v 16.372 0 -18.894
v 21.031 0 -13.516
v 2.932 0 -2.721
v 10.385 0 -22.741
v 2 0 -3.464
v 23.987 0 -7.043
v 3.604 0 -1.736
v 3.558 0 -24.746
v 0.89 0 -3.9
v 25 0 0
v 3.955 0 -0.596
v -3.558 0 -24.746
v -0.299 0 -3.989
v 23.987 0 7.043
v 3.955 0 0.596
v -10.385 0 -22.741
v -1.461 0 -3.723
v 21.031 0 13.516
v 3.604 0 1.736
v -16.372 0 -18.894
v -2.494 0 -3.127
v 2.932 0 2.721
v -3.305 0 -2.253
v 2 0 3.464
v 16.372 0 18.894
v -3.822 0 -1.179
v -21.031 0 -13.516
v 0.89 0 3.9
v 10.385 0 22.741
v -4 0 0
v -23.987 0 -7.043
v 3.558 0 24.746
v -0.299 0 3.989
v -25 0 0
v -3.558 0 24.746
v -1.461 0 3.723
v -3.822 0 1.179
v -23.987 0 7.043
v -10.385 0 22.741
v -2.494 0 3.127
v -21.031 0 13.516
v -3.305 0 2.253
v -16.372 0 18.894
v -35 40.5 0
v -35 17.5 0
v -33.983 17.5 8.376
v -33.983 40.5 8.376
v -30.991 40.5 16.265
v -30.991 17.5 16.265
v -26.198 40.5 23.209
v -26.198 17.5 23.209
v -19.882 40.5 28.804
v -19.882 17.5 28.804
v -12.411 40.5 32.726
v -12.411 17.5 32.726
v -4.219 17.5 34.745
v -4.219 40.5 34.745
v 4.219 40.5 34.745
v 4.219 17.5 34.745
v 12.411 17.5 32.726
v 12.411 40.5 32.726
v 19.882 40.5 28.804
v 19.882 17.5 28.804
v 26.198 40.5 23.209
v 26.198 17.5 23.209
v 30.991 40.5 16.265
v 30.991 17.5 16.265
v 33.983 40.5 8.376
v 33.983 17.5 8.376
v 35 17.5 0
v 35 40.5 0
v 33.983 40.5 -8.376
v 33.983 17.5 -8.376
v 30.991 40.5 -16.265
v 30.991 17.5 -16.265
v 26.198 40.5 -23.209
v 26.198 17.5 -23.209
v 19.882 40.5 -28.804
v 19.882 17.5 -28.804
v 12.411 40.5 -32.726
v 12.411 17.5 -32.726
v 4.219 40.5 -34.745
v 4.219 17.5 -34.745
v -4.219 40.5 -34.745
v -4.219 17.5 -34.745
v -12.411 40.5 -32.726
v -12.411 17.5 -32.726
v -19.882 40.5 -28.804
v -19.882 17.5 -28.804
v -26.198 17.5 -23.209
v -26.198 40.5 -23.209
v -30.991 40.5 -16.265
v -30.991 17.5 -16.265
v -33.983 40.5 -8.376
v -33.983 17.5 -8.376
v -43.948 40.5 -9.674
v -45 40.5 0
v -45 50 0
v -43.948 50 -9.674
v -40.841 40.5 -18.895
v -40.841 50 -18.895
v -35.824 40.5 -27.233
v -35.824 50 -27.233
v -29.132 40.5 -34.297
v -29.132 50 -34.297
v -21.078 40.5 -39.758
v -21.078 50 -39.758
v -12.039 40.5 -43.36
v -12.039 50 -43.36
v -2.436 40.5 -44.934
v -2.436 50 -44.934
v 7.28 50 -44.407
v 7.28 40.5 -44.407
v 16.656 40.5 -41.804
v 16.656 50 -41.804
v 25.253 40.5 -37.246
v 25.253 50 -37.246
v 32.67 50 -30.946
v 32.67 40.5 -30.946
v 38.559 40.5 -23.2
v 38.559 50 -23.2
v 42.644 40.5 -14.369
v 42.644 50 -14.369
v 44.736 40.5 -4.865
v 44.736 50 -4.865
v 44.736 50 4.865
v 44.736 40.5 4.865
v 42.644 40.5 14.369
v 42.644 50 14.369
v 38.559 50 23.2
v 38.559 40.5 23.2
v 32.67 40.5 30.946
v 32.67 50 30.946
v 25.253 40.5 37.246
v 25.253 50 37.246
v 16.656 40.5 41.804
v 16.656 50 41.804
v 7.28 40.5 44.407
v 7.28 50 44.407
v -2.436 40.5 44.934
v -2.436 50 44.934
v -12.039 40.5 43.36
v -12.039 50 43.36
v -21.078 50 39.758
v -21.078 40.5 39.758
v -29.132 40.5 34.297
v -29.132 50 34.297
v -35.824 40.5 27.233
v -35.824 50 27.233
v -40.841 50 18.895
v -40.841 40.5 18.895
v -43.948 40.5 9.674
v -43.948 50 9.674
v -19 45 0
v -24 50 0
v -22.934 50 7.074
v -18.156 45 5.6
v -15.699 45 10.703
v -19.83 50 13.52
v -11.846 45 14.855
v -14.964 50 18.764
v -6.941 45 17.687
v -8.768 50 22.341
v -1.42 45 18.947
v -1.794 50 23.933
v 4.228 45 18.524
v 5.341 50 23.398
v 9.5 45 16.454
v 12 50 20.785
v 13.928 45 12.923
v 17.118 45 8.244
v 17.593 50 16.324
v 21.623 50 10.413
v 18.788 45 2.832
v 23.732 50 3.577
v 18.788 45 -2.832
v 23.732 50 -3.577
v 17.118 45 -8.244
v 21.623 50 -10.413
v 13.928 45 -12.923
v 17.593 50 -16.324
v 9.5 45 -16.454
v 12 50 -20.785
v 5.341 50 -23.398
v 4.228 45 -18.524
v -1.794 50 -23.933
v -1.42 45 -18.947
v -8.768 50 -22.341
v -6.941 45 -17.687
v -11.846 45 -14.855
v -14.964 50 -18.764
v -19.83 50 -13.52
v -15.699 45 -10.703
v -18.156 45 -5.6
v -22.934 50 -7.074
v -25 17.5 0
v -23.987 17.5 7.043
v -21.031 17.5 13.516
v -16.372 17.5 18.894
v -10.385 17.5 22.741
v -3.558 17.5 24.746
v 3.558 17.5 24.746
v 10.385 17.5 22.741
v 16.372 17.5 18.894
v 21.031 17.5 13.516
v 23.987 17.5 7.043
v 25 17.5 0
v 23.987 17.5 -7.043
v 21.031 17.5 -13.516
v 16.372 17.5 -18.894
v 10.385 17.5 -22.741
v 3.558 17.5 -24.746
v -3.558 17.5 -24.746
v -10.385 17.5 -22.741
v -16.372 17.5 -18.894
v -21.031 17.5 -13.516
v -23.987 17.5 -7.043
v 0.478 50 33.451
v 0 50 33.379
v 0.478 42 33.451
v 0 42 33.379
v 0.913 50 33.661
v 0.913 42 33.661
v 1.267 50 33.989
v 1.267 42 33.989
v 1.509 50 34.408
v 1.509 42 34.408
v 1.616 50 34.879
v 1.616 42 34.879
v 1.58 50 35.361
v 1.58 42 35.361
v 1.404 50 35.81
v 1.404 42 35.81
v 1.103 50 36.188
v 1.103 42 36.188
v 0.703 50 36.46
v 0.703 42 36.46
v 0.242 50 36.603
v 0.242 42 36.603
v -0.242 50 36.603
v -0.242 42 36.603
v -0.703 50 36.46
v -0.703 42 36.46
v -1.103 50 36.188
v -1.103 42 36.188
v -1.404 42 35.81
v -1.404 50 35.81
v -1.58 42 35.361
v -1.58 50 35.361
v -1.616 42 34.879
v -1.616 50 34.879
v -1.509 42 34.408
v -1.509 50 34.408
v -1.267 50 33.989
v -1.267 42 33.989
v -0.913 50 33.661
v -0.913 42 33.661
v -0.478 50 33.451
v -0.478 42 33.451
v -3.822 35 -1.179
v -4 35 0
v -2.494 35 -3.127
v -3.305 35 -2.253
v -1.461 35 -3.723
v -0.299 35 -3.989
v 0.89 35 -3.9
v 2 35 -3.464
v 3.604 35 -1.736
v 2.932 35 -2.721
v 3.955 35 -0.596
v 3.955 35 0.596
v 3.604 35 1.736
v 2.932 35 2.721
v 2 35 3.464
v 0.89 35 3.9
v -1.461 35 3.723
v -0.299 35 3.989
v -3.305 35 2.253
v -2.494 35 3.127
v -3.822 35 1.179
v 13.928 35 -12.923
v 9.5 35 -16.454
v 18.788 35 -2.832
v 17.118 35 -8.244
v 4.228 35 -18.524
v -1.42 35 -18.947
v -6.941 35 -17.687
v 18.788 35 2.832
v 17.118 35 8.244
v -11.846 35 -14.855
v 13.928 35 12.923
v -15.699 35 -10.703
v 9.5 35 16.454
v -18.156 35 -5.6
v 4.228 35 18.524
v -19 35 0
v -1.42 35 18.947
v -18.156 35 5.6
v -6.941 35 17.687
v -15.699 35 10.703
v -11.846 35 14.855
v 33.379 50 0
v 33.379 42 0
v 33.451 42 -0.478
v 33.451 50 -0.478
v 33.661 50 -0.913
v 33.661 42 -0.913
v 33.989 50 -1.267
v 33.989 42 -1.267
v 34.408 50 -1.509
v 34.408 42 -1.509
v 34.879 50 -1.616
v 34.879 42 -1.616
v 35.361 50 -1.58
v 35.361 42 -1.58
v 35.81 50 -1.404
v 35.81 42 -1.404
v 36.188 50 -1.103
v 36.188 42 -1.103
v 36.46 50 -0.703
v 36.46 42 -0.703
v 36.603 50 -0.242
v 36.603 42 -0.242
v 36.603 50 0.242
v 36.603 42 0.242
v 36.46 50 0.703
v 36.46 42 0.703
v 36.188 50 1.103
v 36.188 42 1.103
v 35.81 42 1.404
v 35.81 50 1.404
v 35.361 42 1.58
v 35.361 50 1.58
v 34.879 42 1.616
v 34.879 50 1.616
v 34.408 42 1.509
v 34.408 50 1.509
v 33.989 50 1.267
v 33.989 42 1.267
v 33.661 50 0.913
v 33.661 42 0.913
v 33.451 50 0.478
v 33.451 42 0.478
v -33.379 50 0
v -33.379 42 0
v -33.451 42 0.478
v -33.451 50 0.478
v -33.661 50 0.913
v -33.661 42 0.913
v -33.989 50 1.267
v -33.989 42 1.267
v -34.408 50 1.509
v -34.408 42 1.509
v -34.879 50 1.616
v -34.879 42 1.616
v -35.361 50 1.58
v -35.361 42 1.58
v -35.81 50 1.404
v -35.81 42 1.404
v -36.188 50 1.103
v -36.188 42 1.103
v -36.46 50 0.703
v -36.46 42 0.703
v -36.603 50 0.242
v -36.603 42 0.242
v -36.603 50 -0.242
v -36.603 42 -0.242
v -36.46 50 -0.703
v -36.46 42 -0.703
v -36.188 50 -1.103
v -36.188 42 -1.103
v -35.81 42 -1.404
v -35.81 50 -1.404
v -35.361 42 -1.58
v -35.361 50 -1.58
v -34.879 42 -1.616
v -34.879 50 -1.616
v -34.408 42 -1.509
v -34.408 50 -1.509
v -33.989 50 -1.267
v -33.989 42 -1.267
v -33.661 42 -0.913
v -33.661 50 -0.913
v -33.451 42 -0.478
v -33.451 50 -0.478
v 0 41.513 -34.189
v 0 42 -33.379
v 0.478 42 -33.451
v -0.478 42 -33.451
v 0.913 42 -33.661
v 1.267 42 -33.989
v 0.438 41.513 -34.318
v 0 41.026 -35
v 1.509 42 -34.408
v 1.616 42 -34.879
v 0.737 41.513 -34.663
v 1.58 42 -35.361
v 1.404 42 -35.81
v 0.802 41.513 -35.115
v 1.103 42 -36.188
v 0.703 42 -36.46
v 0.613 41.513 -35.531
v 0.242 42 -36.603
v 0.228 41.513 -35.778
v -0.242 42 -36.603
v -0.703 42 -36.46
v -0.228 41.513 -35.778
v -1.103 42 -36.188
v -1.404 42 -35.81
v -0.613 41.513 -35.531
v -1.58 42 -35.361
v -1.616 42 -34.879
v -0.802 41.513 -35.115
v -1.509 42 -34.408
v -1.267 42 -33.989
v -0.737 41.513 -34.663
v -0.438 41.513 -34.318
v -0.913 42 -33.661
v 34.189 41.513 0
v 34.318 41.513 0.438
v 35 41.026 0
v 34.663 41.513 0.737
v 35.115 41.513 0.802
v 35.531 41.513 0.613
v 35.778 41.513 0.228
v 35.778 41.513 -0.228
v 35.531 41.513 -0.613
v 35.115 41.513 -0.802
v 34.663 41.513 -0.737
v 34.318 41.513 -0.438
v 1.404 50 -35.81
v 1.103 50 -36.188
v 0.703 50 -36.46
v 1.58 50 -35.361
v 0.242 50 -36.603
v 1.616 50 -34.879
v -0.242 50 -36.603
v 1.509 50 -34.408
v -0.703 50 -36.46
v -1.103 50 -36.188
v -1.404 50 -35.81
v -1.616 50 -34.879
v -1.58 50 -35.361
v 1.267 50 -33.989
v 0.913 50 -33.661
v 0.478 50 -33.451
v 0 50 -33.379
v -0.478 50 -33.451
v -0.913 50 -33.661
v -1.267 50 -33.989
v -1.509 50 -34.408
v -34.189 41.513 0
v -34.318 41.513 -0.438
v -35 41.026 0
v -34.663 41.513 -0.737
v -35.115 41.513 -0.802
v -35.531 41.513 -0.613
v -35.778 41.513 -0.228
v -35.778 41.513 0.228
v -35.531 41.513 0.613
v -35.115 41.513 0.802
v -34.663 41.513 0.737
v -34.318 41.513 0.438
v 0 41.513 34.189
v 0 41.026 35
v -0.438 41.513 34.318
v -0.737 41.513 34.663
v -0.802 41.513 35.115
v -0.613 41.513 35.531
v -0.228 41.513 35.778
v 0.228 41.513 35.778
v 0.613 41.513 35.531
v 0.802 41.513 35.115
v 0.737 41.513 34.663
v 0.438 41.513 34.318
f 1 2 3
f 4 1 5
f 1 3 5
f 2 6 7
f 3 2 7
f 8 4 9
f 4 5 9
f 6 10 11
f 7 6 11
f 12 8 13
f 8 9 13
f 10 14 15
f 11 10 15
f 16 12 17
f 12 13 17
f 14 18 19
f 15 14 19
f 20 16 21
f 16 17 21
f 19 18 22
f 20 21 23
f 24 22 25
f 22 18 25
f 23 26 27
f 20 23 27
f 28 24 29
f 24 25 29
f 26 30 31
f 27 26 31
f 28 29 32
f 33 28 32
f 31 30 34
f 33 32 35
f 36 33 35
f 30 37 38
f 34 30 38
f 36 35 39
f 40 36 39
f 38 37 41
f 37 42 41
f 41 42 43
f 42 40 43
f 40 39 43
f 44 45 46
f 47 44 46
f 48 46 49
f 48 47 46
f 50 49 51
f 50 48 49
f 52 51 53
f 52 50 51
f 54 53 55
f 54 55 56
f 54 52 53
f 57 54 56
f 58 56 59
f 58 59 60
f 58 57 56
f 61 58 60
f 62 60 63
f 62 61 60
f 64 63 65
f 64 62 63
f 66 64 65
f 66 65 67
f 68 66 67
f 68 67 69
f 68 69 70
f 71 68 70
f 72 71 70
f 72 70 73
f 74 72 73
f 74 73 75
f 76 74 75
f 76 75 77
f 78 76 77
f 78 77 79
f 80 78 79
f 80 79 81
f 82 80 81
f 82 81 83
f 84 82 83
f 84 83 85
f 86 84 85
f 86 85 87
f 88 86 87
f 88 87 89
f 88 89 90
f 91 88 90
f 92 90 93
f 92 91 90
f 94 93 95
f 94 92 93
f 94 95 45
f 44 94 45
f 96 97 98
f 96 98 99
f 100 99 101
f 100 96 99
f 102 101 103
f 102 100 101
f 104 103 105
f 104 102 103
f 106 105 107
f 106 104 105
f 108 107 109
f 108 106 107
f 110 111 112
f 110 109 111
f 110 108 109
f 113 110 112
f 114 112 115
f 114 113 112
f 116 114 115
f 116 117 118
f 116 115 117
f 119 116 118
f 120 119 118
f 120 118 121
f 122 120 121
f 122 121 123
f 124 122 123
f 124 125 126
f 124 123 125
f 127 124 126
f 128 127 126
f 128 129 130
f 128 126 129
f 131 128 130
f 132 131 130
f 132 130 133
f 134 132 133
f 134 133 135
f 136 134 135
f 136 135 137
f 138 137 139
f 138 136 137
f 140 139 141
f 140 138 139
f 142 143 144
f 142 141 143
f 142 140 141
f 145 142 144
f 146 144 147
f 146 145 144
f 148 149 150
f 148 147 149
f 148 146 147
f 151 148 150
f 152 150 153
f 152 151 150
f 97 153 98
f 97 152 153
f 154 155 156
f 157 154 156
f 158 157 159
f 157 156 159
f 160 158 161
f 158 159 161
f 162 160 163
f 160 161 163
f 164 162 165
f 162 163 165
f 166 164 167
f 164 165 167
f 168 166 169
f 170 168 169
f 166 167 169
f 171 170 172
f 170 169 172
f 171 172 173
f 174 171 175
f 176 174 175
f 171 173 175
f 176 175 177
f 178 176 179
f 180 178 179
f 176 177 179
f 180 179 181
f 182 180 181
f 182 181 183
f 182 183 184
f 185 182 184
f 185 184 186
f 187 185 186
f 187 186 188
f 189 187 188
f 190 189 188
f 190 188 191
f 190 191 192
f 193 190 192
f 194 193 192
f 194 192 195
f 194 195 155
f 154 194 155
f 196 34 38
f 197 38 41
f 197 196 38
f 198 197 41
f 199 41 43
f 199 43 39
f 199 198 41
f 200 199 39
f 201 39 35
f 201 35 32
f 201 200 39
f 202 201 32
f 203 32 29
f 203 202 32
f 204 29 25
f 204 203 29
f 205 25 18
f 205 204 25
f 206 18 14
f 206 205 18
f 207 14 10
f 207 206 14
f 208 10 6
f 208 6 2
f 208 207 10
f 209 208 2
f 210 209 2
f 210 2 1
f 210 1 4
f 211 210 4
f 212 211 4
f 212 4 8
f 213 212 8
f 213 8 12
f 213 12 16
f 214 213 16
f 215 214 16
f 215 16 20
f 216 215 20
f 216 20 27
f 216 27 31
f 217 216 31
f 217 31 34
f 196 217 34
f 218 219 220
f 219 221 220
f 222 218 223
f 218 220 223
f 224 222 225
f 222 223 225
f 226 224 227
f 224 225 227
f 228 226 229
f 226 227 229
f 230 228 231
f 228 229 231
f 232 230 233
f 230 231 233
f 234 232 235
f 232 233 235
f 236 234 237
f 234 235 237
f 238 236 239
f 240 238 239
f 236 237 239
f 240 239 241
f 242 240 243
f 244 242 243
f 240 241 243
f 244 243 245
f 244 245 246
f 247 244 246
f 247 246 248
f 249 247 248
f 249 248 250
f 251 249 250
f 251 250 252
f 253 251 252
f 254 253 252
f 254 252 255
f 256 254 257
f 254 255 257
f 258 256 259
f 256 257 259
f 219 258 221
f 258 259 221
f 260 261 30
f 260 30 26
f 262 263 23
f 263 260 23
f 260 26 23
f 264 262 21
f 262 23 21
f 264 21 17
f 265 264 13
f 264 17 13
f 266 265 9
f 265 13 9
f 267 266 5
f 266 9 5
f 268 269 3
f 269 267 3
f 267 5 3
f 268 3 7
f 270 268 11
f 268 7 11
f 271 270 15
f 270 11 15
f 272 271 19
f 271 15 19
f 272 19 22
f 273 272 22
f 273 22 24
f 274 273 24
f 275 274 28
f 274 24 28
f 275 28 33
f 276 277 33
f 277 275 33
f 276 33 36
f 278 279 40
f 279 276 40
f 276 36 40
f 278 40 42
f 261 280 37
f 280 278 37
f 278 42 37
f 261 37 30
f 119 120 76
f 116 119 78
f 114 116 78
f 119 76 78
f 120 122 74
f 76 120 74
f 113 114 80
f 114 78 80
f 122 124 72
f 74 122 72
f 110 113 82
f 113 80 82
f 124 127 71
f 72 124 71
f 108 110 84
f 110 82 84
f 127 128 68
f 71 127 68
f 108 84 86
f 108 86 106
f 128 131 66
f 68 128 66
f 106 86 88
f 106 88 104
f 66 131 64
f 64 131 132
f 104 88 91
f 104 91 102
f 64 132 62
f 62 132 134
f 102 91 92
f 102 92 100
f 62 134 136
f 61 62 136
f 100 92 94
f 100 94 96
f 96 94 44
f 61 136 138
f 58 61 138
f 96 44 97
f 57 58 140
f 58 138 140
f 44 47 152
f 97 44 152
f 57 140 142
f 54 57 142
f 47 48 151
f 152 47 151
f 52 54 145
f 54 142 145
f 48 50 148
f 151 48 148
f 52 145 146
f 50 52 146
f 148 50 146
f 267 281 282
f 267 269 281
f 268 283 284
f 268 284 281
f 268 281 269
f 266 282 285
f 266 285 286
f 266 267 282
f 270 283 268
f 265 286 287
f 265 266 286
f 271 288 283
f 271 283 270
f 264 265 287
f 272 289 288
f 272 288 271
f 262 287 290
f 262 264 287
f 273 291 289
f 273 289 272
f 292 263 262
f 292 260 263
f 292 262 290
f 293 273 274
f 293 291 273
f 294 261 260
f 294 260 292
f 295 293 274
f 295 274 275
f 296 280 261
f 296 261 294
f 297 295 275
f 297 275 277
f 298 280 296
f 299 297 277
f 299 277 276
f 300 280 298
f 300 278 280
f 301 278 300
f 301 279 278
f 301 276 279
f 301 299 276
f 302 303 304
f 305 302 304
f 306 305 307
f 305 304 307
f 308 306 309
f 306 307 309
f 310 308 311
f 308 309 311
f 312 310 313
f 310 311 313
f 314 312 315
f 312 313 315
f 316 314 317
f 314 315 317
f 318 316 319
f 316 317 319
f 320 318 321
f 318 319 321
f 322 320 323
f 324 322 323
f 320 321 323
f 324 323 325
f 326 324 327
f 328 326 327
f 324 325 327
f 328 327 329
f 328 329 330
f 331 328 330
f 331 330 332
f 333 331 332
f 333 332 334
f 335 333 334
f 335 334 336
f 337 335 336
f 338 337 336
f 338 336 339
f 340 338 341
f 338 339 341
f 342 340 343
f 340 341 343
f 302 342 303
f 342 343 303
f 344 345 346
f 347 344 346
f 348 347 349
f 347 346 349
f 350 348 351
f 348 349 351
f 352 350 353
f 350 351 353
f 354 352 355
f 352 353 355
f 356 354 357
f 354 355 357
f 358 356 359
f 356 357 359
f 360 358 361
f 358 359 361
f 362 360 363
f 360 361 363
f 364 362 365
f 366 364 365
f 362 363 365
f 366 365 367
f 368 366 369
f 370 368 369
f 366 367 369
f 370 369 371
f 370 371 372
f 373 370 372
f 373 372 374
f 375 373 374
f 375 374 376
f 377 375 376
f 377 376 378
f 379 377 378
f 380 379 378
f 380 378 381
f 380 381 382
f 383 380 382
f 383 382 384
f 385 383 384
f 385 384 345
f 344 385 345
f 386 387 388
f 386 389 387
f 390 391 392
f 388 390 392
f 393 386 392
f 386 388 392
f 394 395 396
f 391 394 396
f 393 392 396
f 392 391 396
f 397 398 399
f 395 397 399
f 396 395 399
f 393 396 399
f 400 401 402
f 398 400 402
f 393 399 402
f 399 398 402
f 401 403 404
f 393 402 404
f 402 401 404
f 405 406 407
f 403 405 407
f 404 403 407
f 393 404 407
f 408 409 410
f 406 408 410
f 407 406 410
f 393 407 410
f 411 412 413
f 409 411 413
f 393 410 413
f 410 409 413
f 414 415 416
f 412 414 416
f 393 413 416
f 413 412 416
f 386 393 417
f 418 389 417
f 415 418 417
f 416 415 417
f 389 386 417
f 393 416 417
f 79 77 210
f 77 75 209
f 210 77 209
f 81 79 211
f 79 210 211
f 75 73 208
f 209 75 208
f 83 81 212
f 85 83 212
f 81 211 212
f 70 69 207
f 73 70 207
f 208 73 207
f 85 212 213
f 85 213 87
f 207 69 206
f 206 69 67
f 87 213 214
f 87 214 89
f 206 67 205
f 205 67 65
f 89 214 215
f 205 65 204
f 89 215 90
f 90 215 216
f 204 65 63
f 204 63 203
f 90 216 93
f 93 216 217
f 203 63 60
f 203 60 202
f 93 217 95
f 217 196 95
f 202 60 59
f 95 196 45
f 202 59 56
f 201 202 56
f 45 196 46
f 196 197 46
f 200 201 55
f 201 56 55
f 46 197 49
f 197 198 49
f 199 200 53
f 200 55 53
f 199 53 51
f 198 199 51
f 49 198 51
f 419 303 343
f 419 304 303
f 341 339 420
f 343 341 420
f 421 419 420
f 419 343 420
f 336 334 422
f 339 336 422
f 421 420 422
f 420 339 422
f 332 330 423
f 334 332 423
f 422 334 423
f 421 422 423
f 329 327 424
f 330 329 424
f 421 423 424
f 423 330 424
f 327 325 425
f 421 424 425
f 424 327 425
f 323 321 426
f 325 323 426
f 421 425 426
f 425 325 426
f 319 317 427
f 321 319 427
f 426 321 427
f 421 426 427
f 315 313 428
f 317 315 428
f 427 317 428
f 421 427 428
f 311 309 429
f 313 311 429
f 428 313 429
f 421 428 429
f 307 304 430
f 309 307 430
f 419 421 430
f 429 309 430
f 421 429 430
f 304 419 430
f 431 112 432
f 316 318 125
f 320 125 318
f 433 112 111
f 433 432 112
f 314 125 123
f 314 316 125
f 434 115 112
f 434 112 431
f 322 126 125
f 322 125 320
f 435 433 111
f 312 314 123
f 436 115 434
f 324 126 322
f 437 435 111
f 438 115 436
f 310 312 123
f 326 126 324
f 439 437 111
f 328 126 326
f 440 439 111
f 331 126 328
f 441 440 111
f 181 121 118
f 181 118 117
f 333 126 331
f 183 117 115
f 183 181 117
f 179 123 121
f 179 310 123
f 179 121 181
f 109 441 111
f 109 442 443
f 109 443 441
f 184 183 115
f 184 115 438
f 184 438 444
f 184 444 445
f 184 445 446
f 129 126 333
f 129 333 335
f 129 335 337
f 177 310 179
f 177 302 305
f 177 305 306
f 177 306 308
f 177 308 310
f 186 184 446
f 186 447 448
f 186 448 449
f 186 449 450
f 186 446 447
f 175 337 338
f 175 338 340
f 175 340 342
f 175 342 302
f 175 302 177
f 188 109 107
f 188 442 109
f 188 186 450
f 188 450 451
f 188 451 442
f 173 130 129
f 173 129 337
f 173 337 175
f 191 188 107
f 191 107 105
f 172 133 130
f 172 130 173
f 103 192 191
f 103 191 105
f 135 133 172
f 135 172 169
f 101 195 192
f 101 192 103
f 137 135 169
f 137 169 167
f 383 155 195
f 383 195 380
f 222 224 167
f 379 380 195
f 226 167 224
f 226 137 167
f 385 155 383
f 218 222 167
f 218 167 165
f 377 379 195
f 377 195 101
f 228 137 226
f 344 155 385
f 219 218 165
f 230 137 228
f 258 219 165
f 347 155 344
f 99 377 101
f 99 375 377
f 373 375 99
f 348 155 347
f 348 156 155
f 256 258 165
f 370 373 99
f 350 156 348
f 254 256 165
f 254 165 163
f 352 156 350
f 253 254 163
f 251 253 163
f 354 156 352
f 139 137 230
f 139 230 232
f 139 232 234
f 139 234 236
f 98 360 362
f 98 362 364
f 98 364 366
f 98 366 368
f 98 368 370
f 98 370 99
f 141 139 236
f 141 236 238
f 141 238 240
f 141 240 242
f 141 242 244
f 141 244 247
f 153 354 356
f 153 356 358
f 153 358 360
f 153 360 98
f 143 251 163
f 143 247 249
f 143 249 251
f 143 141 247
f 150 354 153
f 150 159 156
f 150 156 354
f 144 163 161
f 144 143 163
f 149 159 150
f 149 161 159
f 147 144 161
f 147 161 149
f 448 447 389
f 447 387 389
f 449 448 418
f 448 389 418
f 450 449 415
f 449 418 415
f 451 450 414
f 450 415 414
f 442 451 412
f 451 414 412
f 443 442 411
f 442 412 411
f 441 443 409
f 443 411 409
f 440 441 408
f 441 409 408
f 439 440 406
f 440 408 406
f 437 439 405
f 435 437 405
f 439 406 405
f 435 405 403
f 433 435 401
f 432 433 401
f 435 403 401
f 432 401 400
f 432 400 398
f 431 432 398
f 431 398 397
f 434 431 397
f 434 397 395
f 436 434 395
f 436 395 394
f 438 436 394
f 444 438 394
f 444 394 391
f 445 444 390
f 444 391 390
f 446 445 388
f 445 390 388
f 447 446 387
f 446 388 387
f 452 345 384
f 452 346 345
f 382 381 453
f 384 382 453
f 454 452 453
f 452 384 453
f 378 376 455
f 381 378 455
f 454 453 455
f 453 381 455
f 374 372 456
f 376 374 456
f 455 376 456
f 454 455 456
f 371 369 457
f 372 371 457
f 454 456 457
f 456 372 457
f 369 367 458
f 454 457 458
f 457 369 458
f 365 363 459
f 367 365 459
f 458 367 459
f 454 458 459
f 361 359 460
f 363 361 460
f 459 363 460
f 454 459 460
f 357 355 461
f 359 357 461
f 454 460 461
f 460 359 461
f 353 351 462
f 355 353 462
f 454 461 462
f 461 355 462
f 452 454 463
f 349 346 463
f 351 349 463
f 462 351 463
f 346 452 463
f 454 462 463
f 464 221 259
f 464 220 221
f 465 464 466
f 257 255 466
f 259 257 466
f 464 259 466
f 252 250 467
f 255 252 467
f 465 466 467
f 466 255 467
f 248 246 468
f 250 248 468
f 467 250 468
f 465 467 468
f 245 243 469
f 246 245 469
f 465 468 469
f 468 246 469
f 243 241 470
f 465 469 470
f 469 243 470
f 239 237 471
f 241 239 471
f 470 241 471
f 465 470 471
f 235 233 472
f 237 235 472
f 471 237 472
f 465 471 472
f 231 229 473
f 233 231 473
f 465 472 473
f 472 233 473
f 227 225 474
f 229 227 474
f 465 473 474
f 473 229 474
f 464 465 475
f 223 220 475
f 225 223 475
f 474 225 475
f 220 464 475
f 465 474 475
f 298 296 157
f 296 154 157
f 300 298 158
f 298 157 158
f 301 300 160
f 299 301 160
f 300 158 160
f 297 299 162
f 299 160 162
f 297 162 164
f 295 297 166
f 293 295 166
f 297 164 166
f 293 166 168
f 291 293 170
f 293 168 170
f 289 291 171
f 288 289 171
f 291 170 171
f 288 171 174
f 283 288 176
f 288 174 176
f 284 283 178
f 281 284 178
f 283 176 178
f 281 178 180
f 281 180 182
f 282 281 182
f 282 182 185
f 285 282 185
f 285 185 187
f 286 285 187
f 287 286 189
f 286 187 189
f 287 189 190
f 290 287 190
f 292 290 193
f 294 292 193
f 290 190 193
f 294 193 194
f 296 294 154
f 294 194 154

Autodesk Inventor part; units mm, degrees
ref_plane "YZ Plane" through (0, 0, 0) normal (1, 0, 0) x (0, 1, 0)
ref_plane "XZ Plane" through (0, 0, 0) normal (0, 1, 0) x (-1, 0, 0)
ref_plane "XY Plane" through (0, 0, 0) normal (0, 0, 1) x (1, 0, 0)
sketch "Sketch2" plane through (0, 0, 0) normal (0, 0, 1) x (1, 0, 0)
  line L0 (-4, 0) -> (-25, 0)
  line L1 (-25, 0) -> (-25, 17.5)
  line L2 (-25, 17.5) -> (-35, 17.5)
  line L3 (-4, 35) -> (-4, 0)
  line L4 (0, 0) -> (0, 29) construction
  line L5 (-4, 35) -> (-19, 35)
  line L6 (-19, 35) -> (-19, 50)
  line L7 (-35, 17.5) -> (-35, 40.5)
  line L8 (-19, 50) -> (-45, 50)
  line L9 (-45, 50) -> (-45, 40.5)
  line L10 (-45, 40.5) -> (-35, 40.5)
  dimension "d11" = 8
  dimension "d13" = 50
  dimension "d28" = 17.5
  dimension "d29" = 35
  dimension "d30" = 15
  dimension "d34" = 70
  dimension "d35" = 50
  dimension "d36" = 23
  dimension "d37" = 90
revolve "Revolution1" add sketch "Sketch2" angle 360 about axis through (0, 0, 0) along (0, 1, 0)
chamfer "Chamfer1" distance 5 angle 45 1 edges at (19, 50, 0)
sketch "Sketch3" plane through (0, 50, 0) normal (0, 1, 0) x (1, 0, 0)
  point P0 (0, 0)
  point P1 (0, 35)
  dimension "d38" = 35
hole "Hole1" at (0, 50, -35) direction (0, -1, 0) diameter 3.242 depth 8 tip angle 118 thread size "M4x0.7" class "6H" standard "ISO Metric profile"
pattern_circular "Circular Pattern1" count 4 over 360 about axis through (0, 42.5, 0) along (0, 1, 0) of "Hole1"
properties part number "M17 - Coil Support Part" material "UHMW, Black"
